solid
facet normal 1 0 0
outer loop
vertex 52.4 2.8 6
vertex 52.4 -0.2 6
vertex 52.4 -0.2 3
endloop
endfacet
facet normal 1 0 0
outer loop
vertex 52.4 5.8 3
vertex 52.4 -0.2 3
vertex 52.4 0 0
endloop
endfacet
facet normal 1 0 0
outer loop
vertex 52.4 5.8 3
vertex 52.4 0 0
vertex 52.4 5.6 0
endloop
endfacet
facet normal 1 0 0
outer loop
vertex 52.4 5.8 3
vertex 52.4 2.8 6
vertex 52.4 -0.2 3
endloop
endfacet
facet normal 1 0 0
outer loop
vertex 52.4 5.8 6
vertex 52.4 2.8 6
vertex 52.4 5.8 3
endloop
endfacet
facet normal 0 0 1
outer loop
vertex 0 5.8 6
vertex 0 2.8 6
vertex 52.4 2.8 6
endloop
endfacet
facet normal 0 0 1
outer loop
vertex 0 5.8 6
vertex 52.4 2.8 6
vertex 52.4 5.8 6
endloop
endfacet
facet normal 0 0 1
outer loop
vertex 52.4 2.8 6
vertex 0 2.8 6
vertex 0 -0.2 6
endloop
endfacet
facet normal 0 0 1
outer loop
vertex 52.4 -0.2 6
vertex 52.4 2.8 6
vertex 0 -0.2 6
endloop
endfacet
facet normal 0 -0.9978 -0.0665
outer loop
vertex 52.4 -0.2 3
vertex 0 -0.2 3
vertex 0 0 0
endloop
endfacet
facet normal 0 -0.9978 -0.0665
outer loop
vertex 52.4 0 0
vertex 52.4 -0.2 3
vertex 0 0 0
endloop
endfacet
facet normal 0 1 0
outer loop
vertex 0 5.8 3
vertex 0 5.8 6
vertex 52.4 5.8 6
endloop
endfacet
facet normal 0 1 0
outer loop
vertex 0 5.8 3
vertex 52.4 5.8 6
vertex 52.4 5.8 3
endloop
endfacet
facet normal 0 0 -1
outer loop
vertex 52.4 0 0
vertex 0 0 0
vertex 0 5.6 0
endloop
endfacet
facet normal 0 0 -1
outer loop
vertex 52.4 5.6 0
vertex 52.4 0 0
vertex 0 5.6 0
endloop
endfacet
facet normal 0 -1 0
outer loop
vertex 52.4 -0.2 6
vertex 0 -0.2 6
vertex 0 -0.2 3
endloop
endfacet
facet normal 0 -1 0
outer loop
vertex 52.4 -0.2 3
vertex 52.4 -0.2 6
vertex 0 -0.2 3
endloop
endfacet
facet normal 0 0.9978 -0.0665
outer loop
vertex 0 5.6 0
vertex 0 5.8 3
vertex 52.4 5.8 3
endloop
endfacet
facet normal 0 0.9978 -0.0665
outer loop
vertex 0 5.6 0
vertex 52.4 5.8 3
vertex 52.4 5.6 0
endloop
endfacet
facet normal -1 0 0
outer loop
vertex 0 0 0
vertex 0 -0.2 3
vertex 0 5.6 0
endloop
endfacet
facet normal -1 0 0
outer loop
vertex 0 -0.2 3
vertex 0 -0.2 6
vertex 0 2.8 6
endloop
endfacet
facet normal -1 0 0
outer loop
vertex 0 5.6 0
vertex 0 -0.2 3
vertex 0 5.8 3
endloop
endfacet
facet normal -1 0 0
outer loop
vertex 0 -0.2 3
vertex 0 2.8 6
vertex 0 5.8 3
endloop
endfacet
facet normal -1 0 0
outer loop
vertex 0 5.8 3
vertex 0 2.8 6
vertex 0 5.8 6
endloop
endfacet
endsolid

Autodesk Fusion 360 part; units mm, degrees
sketch "Sketch1" plane through (0, 0, 0) normal (1, 0, 0) x (0, 1, 0)
  line L0 (0, 0) -> (5.6, 0)
  line L1 (2.8, 0) -> (2.8, 6) construction
  line L2 (2.8, 6) -> (-0.2, 6)
  line L3 (2.8, 6) -> (5.8, 6)
  line L4 (-0.2, 6) -> (-0.2, 3)
  line L5 (-0.2, 3) -> (0, 0)
  line L6 (5.8, 6) -> (5.8, 3)
  line L7 (5.8, 3) -> (5.6, 0)
  dimension "d1" = 5.6
  dimension "d2" = 3
  dimension "d3" = 3
extrude "Extrude1" add sketch "Sketch1" along normal blind 52.4
